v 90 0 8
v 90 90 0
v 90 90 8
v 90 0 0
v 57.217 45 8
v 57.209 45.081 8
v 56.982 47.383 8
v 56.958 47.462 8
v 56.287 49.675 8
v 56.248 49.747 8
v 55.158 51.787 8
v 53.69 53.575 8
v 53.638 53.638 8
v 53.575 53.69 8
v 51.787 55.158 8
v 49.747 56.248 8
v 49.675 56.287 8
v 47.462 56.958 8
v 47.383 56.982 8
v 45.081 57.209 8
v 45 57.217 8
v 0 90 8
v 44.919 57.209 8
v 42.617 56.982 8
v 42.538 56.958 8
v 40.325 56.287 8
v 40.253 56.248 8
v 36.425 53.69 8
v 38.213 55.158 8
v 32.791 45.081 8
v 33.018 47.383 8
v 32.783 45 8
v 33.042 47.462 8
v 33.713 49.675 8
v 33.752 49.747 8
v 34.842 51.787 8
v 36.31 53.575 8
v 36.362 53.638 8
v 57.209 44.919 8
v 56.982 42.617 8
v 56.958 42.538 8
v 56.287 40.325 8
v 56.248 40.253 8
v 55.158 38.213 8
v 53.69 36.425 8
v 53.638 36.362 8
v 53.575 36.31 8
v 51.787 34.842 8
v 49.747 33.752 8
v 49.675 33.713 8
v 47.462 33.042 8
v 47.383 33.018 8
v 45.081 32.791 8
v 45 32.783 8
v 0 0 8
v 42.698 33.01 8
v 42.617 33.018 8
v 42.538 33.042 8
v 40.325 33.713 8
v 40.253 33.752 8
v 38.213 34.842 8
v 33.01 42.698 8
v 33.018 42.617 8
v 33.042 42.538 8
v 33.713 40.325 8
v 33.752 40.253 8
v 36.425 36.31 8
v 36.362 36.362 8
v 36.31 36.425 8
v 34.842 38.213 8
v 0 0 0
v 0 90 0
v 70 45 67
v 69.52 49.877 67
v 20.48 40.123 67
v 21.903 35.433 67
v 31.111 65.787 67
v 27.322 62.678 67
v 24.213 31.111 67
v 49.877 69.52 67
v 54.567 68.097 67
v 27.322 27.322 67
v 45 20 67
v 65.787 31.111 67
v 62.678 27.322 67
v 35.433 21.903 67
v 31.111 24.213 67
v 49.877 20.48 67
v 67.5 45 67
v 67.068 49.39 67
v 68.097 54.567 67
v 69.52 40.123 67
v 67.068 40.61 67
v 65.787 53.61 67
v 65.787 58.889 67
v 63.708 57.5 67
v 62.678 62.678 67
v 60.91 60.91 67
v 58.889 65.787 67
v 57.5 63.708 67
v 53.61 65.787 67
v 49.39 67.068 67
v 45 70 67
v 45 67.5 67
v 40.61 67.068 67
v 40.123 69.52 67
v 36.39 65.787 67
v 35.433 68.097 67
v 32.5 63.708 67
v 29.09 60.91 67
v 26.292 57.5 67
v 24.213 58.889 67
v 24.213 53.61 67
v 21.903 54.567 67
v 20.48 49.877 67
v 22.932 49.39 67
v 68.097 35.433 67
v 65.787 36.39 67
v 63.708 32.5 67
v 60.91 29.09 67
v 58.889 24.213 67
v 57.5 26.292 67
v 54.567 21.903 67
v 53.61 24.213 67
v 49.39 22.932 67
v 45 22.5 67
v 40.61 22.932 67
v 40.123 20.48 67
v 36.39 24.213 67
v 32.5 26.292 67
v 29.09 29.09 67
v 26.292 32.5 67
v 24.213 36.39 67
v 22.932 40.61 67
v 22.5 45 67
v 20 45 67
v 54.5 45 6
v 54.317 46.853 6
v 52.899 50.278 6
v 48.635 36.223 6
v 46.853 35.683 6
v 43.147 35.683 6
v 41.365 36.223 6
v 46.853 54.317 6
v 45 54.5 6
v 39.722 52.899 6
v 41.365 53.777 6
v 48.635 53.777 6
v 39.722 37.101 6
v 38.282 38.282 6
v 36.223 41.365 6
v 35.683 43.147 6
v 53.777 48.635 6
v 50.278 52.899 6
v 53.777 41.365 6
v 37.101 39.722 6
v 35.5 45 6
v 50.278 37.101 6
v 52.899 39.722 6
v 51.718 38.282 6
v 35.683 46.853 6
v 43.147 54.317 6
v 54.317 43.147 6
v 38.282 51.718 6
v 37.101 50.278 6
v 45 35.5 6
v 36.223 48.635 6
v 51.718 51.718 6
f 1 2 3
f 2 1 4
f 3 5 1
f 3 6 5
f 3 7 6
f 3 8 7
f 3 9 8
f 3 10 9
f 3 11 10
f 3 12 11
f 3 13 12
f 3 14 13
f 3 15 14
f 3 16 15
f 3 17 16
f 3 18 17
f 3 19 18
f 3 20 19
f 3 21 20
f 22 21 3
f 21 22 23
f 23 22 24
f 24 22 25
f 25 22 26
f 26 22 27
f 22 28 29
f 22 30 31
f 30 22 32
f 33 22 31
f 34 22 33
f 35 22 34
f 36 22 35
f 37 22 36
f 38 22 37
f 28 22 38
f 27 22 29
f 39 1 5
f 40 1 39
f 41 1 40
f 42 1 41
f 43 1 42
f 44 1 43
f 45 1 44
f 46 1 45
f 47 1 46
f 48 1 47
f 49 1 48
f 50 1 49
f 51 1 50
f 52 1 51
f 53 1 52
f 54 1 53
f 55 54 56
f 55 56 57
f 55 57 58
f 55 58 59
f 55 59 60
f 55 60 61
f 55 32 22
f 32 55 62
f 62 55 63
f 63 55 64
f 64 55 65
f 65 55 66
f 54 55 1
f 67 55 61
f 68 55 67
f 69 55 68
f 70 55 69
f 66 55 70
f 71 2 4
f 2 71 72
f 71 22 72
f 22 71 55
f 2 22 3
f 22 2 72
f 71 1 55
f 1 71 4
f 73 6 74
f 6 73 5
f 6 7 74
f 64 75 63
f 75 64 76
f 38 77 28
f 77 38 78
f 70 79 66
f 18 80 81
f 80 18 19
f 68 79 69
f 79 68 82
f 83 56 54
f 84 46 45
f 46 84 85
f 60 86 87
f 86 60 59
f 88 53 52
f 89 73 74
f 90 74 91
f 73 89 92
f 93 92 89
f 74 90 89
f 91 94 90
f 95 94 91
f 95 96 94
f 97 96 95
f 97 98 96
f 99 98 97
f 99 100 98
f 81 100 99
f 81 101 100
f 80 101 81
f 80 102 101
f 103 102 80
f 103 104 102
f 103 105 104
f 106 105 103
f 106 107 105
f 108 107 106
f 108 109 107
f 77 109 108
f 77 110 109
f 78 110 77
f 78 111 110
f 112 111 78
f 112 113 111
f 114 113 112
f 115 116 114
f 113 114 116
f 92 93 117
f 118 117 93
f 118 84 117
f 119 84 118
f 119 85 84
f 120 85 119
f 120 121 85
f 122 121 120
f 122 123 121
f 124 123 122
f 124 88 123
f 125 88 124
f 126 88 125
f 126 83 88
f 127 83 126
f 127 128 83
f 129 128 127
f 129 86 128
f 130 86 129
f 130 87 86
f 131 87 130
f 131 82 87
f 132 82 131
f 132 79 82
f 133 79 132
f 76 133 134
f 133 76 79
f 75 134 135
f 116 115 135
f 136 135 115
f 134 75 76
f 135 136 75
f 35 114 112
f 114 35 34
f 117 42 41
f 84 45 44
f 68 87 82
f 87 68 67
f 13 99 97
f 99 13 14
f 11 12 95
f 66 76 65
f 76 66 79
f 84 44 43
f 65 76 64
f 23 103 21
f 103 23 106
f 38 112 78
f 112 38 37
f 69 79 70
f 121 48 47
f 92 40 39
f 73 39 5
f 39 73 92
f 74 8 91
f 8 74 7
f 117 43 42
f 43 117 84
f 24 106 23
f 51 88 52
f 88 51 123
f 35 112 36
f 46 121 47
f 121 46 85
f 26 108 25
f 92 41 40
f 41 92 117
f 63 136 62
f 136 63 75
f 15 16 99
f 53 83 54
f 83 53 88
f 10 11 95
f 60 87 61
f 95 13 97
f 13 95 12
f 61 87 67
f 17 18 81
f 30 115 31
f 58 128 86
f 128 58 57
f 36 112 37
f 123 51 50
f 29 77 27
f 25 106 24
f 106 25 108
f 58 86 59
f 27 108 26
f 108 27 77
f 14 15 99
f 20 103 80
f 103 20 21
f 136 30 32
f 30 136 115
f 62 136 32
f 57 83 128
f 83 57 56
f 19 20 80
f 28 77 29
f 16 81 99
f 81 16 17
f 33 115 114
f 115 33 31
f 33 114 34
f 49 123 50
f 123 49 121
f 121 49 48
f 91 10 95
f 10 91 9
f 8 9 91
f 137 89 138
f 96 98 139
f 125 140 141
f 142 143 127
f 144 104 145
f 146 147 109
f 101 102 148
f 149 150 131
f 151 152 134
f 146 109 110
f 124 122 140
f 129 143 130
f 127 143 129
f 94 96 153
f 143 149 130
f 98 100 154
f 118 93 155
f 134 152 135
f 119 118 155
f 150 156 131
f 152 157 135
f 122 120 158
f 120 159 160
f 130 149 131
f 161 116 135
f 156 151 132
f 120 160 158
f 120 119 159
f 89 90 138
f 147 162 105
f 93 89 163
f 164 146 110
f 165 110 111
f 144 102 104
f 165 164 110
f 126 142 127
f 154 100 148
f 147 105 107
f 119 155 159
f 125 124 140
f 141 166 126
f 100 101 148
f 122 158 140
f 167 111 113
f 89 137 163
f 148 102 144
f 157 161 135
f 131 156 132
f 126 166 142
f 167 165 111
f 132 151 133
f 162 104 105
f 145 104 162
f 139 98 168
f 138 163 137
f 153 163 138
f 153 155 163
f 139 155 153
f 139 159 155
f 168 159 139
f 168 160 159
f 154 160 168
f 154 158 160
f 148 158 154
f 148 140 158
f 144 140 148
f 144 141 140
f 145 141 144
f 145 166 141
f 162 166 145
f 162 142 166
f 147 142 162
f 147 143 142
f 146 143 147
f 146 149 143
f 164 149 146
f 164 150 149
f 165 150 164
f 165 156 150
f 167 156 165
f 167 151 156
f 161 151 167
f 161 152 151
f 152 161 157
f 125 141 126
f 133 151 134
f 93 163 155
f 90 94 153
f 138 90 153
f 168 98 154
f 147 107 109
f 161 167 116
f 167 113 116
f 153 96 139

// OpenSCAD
$fn = 32;

// ----------------------------------------------------------------------
// Hopper: funnel with square flange
// ----------------------------------------------------------------------

// --- parameters (mm) ---
fl = 90;                  // flange side, X and Y
fl_t = 8;                 // flange thickness
cone_h = 60;              // cone height above the flange
top_d = 50;               // cone mouth diameter
bot_d = 24;               // cone spout diameter
wall = 2.5;               // cone wall thickness

bore_d = bot_d - 2 * wall;  // spout bore diameter
total_h = fl_t + cone_h - 1;  // overall height

difference() {
  union() {
    cube([fl, fl, fl_t]);
    translate([fl / 2, fl / 2, fl_t - 1])
      cylinder(h = cone_h, d1 = bot_d, d2 = top_d);
  }
  translate([fl / 2, fl / 2, fl_t - 2])
    cylinder(h = cone_h + 1, d1 = bore_d, d2 = top_d - 2 * wall);
}
